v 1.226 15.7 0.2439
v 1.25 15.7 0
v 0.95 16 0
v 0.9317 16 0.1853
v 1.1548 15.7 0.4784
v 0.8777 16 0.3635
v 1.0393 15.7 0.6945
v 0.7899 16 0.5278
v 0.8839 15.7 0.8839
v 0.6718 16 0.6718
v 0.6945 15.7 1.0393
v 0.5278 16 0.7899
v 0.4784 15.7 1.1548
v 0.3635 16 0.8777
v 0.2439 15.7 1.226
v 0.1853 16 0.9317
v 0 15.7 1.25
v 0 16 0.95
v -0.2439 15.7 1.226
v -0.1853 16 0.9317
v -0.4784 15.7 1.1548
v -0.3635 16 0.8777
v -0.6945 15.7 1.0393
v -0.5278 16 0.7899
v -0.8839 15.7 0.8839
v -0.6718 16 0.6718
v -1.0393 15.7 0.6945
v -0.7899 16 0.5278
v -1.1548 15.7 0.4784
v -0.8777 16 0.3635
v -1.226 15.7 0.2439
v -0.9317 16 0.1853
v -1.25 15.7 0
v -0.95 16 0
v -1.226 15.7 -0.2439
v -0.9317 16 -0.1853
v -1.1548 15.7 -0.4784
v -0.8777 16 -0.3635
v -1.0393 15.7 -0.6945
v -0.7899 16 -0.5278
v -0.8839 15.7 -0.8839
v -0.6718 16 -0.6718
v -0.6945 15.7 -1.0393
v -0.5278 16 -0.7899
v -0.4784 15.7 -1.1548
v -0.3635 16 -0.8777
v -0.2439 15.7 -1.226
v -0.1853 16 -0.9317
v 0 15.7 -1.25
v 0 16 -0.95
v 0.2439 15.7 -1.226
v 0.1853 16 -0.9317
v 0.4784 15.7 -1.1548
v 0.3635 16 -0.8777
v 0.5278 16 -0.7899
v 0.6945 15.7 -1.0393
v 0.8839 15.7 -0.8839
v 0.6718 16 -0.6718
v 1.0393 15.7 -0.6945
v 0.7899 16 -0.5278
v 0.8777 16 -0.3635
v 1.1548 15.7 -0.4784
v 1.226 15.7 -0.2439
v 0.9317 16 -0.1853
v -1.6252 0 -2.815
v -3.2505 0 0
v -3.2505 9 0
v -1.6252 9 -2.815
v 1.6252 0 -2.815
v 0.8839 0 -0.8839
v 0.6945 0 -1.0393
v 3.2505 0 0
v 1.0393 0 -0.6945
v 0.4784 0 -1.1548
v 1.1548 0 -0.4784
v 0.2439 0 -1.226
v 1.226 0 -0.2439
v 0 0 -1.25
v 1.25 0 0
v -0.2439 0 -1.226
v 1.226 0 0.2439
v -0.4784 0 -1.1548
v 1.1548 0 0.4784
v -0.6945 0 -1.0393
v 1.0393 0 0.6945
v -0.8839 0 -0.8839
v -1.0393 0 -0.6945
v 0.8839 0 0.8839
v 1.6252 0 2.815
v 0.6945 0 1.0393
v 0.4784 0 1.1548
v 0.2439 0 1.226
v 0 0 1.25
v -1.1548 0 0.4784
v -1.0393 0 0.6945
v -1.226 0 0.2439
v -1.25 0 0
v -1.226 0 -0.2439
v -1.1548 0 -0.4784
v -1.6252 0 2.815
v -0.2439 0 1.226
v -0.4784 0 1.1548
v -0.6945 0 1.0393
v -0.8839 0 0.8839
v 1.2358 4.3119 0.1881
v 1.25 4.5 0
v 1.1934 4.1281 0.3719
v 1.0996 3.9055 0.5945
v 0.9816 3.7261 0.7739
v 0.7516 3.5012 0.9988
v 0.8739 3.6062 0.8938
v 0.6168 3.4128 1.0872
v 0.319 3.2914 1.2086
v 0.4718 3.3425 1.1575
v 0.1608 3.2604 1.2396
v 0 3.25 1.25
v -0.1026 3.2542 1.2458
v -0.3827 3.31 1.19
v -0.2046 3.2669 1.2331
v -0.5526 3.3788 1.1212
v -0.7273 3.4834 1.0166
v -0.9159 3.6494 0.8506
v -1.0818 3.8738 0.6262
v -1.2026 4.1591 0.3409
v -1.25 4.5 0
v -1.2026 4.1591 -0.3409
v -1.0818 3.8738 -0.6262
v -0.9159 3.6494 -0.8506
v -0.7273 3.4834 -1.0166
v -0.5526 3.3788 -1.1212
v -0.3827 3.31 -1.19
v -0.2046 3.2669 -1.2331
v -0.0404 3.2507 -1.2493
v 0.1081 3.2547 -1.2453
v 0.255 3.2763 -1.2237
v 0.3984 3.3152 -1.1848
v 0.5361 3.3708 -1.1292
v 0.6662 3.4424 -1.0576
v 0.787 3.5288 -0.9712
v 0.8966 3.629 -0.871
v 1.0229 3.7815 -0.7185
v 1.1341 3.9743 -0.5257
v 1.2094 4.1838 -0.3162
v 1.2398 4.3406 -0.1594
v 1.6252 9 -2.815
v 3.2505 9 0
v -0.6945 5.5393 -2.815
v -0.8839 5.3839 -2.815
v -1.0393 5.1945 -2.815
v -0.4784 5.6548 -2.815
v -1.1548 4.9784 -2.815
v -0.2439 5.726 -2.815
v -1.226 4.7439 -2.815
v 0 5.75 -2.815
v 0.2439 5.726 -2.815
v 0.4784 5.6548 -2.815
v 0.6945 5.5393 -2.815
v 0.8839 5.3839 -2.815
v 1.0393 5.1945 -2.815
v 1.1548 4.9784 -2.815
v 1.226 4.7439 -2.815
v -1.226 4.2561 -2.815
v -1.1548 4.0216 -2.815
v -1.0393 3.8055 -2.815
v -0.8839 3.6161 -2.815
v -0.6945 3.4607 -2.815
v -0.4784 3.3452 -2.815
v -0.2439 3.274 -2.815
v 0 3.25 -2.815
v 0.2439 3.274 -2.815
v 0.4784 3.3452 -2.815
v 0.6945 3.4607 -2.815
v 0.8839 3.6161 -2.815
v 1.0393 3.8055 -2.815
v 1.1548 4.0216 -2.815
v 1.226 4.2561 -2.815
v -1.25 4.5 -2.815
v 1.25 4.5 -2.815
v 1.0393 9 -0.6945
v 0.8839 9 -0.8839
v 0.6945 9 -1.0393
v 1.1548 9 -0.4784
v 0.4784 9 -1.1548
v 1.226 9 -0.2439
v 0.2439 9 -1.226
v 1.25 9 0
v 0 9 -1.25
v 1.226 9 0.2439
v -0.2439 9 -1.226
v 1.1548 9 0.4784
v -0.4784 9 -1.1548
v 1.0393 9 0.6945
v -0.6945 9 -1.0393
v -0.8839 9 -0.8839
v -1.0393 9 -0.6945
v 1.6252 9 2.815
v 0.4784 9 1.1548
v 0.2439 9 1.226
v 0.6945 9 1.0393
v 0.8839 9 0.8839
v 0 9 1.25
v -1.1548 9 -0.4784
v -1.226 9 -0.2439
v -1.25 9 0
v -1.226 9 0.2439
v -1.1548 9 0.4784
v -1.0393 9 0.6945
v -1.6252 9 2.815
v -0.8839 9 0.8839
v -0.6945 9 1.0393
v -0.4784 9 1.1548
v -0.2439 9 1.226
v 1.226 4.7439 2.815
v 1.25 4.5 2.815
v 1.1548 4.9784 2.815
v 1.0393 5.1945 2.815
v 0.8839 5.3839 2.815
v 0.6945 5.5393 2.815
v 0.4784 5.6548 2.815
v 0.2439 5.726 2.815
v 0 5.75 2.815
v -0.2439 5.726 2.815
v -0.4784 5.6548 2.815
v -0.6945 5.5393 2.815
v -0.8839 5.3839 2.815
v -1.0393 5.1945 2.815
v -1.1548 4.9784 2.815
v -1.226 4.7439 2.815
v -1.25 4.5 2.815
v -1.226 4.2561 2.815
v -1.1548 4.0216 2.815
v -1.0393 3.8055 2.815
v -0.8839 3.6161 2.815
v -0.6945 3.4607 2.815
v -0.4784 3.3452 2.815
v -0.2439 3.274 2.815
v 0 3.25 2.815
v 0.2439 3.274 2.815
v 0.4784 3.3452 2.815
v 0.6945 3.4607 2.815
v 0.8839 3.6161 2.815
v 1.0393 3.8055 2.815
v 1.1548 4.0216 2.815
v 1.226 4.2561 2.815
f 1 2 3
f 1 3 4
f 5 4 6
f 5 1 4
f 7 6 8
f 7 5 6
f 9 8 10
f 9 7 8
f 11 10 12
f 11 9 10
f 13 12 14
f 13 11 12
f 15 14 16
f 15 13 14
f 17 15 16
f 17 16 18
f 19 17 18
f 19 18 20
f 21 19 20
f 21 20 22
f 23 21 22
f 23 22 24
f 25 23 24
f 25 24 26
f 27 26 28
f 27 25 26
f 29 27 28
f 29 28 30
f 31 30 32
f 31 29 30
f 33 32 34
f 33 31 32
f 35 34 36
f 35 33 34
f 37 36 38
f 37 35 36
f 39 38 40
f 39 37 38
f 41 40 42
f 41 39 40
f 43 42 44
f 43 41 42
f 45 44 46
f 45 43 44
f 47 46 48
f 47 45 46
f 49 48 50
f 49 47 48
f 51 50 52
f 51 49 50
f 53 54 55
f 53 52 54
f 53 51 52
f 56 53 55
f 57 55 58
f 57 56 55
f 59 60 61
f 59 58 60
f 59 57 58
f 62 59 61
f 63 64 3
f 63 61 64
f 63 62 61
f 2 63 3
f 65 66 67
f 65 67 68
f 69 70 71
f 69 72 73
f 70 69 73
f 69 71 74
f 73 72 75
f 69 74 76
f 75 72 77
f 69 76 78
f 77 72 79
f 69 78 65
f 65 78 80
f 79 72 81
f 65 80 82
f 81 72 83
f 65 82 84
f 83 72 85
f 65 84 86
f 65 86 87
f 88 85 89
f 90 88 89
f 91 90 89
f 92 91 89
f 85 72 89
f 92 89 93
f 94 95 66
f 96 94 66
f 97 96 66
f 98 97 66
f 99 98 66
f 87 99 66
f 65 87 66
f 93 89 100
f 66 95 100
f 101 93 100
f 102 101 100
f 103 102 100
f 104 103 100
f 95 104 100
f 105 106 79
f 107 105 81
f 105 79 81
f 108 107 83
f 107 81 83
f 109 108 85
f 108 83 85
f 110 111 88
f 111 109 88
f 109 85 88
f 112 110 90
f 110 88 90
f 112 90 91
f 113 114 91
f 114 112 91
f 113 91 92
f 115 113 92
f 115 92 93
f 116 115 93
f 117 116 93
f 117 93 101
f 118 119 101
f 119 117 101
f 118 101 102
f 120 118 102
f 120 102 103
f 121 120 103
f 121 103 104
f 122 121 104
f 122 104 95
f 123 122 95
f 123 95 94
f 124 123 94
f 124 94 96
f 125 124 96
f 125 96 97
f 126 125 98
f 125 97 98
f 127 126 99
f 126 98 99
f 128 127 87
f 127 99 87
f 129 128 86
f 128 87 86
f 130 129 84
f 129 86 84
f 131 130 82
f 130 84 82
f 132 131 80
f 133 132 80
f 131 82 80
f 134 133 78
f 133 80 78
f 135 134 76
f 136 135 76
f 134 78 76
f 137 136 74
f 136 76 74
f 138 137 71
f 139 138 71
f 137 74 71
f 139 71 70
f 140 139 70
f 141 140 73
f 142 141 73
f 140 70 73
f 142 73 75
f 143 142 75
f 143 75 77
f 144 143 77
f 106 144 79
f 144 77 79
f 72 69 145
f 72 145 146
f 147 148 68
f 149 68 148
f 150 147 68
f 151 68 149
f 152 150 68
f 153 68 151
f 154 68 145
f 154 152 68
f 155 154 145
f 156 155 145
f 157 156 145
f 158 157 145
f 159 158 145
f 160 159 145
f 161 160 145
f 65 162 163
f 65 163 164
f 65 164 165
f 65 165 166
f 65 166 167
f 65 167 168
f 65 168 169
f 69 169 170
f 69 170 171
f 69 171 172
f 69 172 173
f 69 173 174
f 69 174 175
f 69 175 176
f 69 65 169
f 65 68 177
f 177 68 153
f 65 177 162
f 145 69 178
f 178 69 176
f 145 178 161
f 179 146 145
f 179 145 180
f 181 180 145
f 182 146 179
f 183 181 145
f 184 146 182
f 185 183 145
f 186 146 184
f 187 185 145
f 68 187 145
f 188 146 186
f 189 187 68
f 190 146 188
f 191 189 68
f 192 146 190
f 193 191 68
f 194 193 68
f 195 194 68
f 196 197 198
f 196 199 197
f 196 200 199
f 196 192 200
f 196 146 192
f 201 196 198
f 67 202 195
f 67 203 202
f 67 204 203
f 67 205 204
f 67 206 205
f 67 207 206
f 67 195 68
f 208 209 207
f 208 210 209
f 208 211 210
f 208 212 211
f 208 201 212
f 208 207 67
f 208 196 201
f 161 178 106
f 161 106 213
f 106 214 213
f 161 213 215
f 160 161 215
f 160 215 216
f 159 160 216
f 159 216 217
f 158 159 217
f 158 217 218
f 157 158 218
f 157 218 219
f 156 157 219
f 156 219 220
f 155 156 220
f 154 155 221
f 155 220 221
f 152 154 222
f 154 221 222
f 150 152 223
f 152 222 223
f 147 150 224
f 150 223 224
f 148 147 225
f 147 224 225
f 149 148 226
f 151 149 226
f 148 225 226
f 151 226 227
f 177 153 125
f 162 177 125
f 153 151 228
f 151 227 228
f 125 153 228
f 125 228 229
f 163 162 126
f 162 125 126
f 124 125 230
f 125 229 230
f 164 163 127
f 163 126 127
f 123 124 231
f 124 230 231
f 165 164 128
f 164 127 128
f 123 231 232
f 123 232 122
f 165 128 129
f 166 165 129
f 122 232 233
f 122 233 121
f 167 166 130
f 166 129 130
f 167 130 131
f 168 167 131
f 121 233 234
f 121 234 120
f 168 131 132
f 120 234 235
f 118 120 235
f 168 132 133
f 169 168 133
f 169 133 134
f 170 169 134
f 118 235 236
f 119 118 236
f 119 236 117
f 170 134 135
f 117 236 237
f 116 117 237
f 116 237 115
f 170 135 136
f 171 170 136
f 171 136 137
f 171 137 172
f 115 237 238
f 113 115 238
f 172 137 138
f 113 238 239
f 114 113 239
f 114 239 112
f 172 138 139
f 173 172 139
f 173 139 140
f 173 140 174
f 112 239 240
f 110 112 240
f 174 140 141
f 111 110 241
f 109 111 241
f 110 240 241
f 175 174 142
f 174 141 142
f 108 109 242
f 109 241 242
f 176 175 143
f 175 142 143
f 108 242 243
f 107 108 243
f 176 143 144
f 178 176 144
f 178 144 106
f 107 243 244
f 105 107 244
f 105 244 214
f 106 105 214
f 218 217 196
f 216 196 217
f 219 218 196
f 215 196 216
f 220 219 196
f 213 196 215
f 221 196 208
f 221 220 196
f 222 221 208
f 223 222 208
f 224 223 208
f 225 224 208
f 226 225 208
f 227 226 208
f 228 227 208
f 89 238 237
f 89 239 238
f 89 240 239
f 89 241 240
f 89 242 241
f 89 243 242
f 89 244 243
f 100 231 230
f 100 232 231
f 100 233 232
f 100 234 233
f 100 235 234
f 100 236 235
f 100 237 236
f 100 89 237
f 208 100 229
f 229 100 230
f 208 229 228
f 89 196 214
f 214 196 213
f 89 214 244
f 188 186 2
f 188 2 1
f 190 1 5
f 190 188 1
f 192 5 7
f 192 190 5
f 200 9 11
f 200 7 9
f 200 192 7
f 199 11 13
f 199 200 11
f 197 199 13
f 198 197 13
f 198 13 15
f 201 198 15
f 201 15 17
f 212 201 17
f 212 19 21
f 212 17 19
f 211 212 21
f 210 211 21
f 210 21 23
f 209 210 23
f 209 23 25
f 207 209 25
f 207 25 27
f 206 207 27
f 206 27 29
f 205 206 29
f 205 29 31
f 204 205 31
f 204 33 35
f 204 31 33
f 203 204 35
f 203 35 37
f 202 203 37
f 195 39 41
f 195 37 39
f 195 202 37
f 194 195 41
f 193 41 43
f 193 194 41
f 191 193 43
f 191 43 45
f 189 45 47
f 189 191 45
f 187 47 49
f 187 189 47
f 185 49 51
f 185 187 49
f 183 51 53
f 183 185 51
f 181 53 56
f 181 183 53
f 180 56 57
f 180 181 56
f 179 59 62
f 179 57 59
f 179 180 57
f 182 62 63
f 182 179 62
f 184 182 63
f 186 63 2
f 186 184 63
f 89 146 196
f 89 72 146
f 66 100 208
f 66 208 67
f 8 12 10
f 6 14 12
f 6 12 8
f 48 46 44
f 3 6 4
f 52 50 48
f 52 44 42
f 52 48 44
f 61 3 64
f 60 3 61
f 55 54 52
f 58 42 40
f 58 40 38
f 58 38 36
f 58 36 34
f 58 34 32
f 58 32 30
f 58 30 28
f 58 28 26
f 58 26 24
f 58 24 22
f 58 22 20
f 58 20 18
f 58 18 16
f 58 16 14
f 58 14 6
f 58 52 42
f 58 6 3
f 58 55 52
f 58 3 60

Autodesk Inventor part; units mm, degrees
ref_plane "YZ Plane" through (0, 0, 0) normal (1, 0, 0) x (0, 1, 0)
ref_plane "XZ Plane" through (0, 0, 0) normal (0, 1, 0) x (-1, 0, 0)
ref_plane "XY Plane" through (0, 0, 0) normal (0, 0, 1) x (1, 0, 0)
sketch "Sketch1" plane through (0, 0, 0) normal (0, 1, 0) x (-1, 0, 0)
  line L0 (-1.6252, -2.815) -> (-3.2505, 0)
  line L1 (-3.2505, 0) -> (-1.6252, 2.815)
  line L2 (-1.6252, 2.815) -> (1.6252, 2.815)
  line L3 (1.6252, 2.815) -> (3.2505, 0)
  line L4 (3.2505, 0) -> (1.6252, -2.815)
  line L5 (1.6252, -2.815) -> (-1.6252, -2.815)
  point P0 (0, 0)
  point P1 (0, 0)
  dimension "d0" = 5.63
extrude "Extrusion1" add sketch "Sketch1" along normal blind 9
sketch "Sketch2" plane through (0, 9, 0) normal (0, 1, 0) x (1, 0, 0)
  circle A0 centre (0, 0) radius 1.25
  dimension "d3" = 2.5
extrude "Extrusion2" add sketch "Sketch2" along normal blind 7
thread "Thread1" size "M2.5x0.45" class "6g" standard "ANSI Metric M Profile" length 3.5
chamfer "Chamfer1" distance 0.3 angle 45 1 edges at (-1.25, 16, 0)
sketch "Sketch3" plane through (-1.6252, 0, 2.815) normal (0, 0, 1) x (1, 0, 0)
  circle A0 centre (1.6252, 4.5) radius 1.25
  line L0 (0, 0) -> (3.2505, 0) projected
  point P0 (1.6252, 0)
  point P1 (1.6252, 0)
  dimension "d11" = 2.5
  dimension "d12" = 4.5
extrude "Extrusion3" cut sketch "Sketch3" against normal through all
sketch "Sketch4" plane through (0, 0, 0) normal (0, -1, 0) x (1, 0, 0)
  circle A0 centre (0, 0) radius 1.25
  dimension "d15" = 2.5
extrude "Extrusion4" cut sketch "Sketch4" against normal blind 4.5
properties part number "18102021-002-04" material "ABS Plastic"
